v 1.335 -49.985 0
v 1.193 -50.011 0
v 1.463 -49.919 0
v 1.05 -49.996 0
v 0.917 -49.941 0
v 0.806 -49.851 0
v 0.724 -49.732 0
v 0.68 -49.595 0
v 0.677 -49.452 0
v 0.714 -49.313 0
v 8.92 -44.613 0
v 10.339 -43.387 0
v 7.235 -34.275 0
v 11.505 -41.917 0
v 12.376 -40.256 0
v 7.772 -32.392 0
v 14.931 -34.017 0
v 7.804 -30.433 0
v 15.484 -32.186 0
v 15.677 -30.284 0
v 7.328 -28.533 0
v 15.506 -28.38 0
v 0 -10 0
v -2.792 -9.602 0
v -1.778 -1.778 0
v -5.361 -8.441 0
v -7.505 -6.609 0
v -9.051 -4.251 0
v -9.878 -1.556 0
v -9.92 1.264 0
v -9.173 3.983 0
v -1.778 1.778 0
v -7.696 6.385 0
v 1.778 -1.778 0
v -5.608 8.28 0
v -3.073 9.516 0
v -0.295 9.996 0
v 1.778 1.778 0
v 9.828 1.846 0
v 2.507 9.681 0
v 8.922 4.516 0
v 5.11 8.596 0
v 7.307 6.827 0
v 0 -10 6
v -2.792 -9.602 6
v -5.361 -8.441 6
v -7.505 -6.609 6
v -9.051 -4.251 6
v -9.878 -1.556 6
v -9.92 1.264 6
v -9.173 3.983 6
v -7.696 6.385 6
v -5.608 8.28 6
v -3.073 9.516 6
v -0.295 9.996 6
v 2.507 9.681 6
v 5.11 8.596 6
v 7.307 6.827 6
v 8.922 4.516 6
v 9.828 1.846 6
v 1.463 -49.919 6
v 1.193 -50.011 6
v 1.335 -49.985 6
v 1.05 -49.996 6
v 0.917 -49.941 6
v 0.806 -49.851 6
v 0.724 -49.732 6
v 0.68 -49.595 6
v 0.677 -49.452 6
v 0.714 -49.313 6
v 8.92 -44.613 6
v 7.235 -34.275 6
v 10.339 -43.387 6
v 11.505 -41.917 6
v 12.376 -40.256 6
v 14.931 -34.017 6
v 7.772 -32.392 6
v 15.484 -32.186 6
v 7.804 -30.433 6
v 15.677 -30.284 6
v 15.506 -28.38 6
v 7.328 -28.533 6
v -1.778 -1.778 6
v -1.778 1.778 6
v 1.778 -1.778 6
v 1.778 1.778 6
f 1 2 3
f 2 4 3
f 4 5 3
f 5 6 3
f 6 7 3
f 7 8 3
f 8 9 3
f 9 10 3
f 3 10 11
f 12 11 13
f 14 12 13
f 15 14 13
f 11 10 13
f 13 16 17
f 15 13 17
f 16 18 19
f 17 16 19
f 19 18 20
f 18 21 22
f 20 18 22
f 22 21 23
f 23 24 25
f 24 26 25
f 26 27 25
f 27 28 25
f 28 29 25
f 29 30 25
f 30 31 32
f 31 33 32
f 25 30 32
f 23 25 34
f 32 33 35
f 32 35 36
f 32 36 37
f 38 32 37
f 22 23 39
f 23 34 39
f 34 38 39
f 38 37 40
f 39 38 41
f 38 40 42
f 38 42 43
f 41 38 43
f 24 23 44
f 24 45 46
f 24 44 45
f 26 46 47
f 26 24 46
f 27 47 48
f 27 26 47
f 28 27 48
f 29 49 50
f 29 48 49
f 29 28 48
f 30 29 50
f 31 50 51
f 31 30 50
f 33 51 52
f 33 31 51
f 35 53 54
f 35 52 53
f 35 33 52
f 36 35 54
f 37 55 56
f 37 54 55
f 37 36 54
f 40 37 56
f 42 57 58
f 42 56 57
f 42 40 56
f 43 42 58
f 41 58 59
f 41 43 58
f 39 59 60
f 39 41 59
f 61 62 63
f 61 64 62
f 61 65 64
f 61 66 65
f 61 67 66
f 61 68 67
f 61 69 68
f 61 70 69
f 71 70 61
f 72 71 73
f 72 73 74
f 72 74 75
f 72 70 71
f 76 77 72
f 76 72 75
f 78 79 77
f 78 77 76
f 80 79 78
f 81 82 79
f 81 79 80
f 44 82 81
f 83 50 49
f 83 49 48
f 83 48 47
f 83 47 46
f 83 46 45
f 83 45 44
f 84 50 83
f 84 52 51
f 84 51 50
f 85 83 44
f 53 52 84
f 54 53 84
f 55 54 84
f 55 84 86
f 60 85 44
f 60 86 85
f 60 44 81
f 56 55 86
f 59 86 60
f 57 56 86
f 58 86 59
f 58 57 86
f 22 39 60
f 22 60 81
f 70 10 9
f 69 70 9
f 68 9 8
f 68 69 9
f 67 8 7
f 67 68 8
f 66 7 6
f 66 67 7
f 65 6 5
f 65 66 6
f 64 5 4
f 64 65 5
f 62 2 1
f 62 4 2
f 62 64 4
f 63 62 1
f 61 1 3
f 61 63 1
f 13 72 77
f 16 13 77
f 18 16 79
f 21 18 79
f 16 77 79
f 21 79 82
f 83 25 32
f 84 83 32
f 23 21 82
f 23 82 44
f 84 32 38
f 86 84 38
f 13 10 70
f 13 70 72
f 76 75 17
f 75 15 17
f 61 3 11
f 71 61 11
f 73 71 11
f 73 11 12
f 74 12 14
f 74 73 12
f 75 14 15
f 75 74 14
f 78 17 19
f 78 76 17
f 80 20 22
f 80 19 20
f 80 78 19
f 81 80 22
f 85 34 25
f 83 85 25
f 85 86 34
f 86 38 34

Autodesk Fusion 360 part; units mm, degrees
sketch "Sketch1" plane through (0, 0, 0) normal (0, 0, 1) x (1, 0, 0)
  circle A0 centre (0, 0) radius 10
  line L0 (-1.778, 1.778) -> (1.778, 1.778)
  line L1 (1.778, 1.778) -> (1.778, -1.778)
  line L2 (1.778, -1.778) -> (-1.778, -1.778)
  line L3 (-1.778, -1.778) -> (-1.778, 1.778)
  line L4 (-1.778, 1.778) -> (1.778, -1.778) construction
  line L5 (1.778, 1.778) -> (-1.778, -1.778) construction
  line L6 (0, 10) -> (0, -50.96)
  line L7 (0, -50.96) -> (11.2783, -42.9344)
  line L8 (0, -50.96) -> (8.4708, -31.4235)
  line L9 (9.8281, 1.8461) -> (16.0511, -31.2832)
  line L10 (11.2783, -42.9344) -> (16.0511, -31.2832)
  line L11 (8.4708, -31.4235) -> (0, -10)
  point P0 (-10, 0)
  point P1 (0, 10)
  dimension "d1" = 20
  dimension "d5" = 3.556
  dimension "d14" = 60.96
extrude "Extrude1" add sketch "Sketch1" along normal blind 6 contours A0 L0 L1 L2 L6 | A0 L7 L8 L9 L10 L11 | A0 L0 L2 L3 L6
fillet "Fillet4" radius 7.5 1 edges at (8.4708, -31.4235, 3)
fillet "Fillet5" radius 10 2 edges at (16.0511, -31.2832, 3) (11.2783, -42.9344, 3)
fillet "Fillet6" radius 0.5 1 edges at (0, -50.96, 3)
